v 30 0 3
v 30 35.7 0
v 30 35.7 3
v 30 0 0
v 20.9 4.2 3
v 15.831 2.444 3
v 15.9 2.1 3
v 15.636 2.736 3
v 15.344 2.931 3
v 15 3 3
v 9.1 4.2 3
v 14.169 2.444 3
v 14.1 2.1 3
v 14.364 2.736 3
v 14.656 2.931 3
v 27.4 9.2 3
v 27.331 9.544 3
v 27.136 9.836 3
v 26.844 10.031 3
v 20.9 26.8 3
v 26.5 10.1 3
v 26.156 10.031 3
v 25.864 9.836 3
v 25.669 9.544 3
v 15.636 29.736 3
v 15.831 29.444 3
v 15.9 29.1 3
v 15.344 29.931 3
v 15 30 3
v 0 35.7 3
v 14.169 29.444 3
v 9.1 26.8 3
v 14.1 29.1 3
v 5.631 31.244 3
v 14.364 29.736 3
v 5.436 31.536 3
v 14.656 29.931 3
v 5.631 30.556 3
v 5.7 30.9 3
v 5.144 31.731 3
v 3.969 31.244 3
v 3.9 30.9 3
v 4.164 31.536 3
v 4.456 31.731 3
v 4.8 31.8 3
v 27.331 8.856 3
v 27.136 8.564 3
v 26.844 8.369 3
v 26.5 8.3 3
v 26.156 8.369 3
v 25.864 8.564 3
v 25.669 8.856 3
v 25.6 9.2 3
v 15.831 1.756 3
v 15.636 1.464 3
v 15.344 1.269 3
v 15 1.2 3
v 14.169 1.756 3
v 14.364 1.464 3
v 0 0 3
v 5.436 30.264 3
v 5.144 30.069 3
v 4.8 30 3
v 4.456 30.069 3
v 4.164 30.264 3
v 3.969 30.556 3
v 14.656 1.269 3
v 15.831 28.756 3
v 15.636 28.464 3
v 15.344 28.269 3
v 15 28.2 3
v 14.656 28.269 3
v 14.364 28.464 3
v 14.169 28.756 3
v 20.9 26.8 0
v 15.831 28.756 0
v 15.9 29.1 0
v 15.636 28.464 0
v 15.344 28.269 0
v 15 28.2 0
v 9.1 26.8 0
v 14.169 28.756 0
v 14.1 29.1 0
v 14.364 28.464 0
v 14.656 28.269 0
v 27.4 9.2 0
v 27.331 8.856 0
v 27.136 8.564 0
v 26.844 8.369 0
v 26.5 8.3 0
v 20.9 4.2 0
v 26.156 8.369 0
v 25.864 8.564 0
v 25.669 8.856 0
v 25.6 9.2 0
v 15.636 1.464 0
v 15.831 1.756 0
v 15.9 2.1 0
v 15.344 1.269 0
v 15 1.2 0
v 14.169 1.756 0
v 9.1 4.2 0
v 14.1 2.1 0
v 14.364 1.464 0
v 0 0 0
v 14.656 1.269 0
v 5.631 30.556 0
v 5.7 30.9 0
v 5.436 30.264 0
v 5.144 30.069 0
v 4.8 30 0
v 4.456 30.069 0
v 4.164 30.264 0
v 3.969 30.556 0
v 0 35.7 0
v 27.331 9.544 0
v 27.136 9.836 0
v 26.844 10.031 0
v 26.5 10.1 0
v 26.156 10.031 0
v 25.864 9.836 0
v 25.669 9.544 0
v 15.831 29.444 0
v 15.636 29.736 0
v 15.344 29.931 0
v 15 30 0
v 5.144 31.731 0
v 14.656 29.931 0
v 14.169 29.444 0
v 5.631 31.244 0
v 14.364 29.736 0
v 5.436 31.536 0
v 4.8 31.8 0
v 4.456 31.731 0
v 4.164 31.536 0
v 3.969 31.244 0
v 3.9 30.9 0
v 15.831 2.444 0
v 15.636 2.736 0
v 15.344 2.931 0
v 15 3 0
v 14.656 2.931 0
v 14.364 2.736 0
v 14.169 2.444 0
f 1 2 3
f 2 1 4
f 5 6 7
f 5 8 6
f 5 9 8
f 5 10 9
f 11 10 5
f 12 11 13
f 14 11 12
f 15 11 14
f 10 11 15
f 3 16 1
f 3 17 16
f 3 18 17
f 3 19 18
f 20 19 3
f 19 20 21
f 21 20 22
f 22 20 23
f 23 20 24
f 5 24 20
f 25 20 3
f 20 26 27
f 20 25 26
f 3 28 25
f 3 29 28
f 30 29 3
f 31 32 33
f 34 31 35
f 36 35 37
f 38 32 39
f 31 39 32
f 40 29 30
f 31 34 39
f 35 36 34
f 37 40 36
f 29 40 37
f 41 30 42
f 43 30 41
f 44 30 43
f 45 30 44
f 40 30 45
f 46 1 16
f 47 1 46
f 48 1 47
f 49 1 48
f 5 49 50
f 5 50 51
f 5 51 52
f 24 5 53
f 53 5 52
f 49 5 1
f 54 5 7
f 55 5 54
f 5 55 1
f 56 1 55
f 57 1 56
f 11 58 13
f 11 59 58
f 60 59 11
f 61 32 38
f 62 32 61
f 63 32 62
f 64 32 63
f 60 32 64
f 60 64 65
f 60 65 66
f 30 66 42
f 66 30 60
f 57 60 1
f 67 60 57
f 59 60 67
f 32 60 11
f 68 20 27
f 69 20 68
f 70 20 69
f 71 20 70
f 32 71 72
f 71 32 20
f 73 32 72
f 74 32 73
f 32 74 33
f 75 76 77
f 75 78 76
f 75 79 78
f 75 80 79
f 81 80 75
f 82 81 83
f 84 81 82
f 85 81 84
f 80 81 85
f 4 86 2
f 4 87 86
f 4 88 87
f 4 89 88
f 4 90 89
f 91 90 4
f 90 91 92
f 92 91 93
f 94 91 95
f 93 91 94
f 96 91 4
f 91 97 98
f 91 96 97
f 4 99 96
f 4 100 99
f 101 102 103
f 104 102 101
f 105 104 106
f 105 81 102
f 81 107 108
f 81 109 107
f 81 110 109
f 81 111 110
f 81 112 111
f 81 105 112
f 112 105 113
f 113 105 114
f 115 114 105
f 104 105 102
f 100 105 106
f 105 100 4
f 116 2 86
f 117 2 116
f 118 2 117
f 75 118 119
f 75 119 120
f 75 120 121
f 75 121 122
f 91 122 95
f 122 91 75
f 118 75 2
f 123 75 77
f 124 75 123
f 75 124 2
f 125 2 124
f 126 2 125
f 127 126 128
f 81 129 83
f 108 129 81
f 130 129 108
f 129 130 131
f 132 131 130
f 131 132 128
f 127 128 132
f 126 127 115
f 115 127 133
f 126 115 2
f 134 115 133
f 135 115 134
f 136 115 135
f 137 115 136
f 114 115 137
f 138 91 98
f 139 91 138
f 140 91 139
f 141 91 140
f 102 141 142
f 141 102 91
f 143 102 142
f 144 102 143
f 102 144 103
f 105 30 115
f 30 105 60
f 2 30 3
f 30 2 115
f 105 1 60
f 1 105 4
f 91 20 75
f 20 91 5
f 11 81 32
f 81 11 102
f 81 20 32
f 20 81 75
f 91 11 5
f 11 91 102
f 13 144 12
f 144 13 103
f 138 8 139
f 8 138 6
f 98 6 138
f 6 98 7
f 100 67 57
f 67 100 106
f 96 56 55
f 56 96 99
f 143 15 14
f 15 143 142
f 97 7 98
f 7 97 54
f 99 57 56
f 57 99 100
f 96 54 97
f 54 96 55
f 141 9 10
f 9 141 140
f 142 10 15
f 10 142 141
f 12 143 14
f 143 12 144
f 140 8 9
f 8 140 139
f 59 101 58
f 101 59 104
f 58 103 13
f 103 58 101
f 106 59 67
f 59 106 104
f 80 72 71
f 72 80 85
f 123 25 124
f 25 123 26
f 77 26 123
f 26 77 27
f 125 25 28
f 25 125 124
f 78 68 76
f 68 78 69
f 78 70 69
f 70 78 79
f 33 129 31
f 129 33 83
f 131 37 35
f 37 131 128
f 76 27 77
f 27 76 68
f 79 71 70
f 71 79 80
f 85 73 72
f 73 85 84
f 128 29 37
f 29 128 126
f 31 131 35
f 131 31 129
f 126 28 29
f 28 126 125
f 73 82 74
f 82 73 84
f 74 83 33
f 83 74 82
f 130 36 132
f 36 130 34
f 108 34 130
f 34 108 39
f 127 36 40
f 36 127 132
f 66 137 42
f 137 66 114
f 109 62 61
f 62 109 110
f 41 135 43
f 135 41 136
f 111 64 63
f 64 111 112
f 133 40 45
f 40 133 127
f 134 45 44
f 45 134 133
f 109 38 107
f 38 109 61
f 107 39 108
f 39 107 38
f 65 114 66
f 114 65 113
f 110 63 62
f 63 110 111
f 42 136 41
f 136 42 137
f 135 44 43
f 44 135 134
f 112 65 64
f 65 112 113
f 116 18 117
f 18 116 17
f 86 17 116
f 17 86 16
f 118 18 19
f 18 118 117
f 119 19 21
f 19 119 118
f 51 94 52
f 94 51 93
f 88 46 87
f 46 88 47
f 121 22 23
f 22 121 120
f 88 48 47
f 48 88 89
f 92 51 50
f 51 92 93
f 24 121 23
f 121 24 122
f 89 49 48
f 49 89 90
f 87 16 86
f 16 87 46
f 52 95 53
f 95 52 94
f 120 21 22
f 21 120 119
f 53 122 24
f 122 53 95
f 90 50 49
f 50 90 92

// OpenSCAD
base_x_size = 30;
base_y_size = 35.7;
base_z_size = 3;

tap_hole_depth = 10;
tap_hole_r = 1.8/2; //M2.0 - 0.2

difference(){
	cube(size = [base_x_size, base_y_size, base_z_size], center = false);
	
	//切り欠き
	translate([9.1,4.2,0]) {
		cube(size = [11.8, 22.6, 8], center = false);
	}
	
	//servo固定ねじ穴
	translate( [15 ,2.1, base_z_size] ) {
		cylinder( h = tap_hole_depth, r = tap_hole_r, center = true , $fn=16 );
	}
	translate( [15, 31.2 - 2.1, base_z_size] ){
		cylinder( h = tap_hole_depth, r = tap_hole_r, center = true , $fn=16 );
	}


	//Lower固定ねじ穴
	translate( [4.8 , base_y_size - 4.8, base_z_size] ){
		cylinder( h = tap_hole_depth, r = tap_hole_r, center = true , $fn=16 );
	}
	translate( [base_x_size - 3.5, 5.7 + 3.5, base_z_size] ) {
		cylinder( h = tap_hole_depth, r = tap_hole_r, center = true , $fn=16 );
	}

}
